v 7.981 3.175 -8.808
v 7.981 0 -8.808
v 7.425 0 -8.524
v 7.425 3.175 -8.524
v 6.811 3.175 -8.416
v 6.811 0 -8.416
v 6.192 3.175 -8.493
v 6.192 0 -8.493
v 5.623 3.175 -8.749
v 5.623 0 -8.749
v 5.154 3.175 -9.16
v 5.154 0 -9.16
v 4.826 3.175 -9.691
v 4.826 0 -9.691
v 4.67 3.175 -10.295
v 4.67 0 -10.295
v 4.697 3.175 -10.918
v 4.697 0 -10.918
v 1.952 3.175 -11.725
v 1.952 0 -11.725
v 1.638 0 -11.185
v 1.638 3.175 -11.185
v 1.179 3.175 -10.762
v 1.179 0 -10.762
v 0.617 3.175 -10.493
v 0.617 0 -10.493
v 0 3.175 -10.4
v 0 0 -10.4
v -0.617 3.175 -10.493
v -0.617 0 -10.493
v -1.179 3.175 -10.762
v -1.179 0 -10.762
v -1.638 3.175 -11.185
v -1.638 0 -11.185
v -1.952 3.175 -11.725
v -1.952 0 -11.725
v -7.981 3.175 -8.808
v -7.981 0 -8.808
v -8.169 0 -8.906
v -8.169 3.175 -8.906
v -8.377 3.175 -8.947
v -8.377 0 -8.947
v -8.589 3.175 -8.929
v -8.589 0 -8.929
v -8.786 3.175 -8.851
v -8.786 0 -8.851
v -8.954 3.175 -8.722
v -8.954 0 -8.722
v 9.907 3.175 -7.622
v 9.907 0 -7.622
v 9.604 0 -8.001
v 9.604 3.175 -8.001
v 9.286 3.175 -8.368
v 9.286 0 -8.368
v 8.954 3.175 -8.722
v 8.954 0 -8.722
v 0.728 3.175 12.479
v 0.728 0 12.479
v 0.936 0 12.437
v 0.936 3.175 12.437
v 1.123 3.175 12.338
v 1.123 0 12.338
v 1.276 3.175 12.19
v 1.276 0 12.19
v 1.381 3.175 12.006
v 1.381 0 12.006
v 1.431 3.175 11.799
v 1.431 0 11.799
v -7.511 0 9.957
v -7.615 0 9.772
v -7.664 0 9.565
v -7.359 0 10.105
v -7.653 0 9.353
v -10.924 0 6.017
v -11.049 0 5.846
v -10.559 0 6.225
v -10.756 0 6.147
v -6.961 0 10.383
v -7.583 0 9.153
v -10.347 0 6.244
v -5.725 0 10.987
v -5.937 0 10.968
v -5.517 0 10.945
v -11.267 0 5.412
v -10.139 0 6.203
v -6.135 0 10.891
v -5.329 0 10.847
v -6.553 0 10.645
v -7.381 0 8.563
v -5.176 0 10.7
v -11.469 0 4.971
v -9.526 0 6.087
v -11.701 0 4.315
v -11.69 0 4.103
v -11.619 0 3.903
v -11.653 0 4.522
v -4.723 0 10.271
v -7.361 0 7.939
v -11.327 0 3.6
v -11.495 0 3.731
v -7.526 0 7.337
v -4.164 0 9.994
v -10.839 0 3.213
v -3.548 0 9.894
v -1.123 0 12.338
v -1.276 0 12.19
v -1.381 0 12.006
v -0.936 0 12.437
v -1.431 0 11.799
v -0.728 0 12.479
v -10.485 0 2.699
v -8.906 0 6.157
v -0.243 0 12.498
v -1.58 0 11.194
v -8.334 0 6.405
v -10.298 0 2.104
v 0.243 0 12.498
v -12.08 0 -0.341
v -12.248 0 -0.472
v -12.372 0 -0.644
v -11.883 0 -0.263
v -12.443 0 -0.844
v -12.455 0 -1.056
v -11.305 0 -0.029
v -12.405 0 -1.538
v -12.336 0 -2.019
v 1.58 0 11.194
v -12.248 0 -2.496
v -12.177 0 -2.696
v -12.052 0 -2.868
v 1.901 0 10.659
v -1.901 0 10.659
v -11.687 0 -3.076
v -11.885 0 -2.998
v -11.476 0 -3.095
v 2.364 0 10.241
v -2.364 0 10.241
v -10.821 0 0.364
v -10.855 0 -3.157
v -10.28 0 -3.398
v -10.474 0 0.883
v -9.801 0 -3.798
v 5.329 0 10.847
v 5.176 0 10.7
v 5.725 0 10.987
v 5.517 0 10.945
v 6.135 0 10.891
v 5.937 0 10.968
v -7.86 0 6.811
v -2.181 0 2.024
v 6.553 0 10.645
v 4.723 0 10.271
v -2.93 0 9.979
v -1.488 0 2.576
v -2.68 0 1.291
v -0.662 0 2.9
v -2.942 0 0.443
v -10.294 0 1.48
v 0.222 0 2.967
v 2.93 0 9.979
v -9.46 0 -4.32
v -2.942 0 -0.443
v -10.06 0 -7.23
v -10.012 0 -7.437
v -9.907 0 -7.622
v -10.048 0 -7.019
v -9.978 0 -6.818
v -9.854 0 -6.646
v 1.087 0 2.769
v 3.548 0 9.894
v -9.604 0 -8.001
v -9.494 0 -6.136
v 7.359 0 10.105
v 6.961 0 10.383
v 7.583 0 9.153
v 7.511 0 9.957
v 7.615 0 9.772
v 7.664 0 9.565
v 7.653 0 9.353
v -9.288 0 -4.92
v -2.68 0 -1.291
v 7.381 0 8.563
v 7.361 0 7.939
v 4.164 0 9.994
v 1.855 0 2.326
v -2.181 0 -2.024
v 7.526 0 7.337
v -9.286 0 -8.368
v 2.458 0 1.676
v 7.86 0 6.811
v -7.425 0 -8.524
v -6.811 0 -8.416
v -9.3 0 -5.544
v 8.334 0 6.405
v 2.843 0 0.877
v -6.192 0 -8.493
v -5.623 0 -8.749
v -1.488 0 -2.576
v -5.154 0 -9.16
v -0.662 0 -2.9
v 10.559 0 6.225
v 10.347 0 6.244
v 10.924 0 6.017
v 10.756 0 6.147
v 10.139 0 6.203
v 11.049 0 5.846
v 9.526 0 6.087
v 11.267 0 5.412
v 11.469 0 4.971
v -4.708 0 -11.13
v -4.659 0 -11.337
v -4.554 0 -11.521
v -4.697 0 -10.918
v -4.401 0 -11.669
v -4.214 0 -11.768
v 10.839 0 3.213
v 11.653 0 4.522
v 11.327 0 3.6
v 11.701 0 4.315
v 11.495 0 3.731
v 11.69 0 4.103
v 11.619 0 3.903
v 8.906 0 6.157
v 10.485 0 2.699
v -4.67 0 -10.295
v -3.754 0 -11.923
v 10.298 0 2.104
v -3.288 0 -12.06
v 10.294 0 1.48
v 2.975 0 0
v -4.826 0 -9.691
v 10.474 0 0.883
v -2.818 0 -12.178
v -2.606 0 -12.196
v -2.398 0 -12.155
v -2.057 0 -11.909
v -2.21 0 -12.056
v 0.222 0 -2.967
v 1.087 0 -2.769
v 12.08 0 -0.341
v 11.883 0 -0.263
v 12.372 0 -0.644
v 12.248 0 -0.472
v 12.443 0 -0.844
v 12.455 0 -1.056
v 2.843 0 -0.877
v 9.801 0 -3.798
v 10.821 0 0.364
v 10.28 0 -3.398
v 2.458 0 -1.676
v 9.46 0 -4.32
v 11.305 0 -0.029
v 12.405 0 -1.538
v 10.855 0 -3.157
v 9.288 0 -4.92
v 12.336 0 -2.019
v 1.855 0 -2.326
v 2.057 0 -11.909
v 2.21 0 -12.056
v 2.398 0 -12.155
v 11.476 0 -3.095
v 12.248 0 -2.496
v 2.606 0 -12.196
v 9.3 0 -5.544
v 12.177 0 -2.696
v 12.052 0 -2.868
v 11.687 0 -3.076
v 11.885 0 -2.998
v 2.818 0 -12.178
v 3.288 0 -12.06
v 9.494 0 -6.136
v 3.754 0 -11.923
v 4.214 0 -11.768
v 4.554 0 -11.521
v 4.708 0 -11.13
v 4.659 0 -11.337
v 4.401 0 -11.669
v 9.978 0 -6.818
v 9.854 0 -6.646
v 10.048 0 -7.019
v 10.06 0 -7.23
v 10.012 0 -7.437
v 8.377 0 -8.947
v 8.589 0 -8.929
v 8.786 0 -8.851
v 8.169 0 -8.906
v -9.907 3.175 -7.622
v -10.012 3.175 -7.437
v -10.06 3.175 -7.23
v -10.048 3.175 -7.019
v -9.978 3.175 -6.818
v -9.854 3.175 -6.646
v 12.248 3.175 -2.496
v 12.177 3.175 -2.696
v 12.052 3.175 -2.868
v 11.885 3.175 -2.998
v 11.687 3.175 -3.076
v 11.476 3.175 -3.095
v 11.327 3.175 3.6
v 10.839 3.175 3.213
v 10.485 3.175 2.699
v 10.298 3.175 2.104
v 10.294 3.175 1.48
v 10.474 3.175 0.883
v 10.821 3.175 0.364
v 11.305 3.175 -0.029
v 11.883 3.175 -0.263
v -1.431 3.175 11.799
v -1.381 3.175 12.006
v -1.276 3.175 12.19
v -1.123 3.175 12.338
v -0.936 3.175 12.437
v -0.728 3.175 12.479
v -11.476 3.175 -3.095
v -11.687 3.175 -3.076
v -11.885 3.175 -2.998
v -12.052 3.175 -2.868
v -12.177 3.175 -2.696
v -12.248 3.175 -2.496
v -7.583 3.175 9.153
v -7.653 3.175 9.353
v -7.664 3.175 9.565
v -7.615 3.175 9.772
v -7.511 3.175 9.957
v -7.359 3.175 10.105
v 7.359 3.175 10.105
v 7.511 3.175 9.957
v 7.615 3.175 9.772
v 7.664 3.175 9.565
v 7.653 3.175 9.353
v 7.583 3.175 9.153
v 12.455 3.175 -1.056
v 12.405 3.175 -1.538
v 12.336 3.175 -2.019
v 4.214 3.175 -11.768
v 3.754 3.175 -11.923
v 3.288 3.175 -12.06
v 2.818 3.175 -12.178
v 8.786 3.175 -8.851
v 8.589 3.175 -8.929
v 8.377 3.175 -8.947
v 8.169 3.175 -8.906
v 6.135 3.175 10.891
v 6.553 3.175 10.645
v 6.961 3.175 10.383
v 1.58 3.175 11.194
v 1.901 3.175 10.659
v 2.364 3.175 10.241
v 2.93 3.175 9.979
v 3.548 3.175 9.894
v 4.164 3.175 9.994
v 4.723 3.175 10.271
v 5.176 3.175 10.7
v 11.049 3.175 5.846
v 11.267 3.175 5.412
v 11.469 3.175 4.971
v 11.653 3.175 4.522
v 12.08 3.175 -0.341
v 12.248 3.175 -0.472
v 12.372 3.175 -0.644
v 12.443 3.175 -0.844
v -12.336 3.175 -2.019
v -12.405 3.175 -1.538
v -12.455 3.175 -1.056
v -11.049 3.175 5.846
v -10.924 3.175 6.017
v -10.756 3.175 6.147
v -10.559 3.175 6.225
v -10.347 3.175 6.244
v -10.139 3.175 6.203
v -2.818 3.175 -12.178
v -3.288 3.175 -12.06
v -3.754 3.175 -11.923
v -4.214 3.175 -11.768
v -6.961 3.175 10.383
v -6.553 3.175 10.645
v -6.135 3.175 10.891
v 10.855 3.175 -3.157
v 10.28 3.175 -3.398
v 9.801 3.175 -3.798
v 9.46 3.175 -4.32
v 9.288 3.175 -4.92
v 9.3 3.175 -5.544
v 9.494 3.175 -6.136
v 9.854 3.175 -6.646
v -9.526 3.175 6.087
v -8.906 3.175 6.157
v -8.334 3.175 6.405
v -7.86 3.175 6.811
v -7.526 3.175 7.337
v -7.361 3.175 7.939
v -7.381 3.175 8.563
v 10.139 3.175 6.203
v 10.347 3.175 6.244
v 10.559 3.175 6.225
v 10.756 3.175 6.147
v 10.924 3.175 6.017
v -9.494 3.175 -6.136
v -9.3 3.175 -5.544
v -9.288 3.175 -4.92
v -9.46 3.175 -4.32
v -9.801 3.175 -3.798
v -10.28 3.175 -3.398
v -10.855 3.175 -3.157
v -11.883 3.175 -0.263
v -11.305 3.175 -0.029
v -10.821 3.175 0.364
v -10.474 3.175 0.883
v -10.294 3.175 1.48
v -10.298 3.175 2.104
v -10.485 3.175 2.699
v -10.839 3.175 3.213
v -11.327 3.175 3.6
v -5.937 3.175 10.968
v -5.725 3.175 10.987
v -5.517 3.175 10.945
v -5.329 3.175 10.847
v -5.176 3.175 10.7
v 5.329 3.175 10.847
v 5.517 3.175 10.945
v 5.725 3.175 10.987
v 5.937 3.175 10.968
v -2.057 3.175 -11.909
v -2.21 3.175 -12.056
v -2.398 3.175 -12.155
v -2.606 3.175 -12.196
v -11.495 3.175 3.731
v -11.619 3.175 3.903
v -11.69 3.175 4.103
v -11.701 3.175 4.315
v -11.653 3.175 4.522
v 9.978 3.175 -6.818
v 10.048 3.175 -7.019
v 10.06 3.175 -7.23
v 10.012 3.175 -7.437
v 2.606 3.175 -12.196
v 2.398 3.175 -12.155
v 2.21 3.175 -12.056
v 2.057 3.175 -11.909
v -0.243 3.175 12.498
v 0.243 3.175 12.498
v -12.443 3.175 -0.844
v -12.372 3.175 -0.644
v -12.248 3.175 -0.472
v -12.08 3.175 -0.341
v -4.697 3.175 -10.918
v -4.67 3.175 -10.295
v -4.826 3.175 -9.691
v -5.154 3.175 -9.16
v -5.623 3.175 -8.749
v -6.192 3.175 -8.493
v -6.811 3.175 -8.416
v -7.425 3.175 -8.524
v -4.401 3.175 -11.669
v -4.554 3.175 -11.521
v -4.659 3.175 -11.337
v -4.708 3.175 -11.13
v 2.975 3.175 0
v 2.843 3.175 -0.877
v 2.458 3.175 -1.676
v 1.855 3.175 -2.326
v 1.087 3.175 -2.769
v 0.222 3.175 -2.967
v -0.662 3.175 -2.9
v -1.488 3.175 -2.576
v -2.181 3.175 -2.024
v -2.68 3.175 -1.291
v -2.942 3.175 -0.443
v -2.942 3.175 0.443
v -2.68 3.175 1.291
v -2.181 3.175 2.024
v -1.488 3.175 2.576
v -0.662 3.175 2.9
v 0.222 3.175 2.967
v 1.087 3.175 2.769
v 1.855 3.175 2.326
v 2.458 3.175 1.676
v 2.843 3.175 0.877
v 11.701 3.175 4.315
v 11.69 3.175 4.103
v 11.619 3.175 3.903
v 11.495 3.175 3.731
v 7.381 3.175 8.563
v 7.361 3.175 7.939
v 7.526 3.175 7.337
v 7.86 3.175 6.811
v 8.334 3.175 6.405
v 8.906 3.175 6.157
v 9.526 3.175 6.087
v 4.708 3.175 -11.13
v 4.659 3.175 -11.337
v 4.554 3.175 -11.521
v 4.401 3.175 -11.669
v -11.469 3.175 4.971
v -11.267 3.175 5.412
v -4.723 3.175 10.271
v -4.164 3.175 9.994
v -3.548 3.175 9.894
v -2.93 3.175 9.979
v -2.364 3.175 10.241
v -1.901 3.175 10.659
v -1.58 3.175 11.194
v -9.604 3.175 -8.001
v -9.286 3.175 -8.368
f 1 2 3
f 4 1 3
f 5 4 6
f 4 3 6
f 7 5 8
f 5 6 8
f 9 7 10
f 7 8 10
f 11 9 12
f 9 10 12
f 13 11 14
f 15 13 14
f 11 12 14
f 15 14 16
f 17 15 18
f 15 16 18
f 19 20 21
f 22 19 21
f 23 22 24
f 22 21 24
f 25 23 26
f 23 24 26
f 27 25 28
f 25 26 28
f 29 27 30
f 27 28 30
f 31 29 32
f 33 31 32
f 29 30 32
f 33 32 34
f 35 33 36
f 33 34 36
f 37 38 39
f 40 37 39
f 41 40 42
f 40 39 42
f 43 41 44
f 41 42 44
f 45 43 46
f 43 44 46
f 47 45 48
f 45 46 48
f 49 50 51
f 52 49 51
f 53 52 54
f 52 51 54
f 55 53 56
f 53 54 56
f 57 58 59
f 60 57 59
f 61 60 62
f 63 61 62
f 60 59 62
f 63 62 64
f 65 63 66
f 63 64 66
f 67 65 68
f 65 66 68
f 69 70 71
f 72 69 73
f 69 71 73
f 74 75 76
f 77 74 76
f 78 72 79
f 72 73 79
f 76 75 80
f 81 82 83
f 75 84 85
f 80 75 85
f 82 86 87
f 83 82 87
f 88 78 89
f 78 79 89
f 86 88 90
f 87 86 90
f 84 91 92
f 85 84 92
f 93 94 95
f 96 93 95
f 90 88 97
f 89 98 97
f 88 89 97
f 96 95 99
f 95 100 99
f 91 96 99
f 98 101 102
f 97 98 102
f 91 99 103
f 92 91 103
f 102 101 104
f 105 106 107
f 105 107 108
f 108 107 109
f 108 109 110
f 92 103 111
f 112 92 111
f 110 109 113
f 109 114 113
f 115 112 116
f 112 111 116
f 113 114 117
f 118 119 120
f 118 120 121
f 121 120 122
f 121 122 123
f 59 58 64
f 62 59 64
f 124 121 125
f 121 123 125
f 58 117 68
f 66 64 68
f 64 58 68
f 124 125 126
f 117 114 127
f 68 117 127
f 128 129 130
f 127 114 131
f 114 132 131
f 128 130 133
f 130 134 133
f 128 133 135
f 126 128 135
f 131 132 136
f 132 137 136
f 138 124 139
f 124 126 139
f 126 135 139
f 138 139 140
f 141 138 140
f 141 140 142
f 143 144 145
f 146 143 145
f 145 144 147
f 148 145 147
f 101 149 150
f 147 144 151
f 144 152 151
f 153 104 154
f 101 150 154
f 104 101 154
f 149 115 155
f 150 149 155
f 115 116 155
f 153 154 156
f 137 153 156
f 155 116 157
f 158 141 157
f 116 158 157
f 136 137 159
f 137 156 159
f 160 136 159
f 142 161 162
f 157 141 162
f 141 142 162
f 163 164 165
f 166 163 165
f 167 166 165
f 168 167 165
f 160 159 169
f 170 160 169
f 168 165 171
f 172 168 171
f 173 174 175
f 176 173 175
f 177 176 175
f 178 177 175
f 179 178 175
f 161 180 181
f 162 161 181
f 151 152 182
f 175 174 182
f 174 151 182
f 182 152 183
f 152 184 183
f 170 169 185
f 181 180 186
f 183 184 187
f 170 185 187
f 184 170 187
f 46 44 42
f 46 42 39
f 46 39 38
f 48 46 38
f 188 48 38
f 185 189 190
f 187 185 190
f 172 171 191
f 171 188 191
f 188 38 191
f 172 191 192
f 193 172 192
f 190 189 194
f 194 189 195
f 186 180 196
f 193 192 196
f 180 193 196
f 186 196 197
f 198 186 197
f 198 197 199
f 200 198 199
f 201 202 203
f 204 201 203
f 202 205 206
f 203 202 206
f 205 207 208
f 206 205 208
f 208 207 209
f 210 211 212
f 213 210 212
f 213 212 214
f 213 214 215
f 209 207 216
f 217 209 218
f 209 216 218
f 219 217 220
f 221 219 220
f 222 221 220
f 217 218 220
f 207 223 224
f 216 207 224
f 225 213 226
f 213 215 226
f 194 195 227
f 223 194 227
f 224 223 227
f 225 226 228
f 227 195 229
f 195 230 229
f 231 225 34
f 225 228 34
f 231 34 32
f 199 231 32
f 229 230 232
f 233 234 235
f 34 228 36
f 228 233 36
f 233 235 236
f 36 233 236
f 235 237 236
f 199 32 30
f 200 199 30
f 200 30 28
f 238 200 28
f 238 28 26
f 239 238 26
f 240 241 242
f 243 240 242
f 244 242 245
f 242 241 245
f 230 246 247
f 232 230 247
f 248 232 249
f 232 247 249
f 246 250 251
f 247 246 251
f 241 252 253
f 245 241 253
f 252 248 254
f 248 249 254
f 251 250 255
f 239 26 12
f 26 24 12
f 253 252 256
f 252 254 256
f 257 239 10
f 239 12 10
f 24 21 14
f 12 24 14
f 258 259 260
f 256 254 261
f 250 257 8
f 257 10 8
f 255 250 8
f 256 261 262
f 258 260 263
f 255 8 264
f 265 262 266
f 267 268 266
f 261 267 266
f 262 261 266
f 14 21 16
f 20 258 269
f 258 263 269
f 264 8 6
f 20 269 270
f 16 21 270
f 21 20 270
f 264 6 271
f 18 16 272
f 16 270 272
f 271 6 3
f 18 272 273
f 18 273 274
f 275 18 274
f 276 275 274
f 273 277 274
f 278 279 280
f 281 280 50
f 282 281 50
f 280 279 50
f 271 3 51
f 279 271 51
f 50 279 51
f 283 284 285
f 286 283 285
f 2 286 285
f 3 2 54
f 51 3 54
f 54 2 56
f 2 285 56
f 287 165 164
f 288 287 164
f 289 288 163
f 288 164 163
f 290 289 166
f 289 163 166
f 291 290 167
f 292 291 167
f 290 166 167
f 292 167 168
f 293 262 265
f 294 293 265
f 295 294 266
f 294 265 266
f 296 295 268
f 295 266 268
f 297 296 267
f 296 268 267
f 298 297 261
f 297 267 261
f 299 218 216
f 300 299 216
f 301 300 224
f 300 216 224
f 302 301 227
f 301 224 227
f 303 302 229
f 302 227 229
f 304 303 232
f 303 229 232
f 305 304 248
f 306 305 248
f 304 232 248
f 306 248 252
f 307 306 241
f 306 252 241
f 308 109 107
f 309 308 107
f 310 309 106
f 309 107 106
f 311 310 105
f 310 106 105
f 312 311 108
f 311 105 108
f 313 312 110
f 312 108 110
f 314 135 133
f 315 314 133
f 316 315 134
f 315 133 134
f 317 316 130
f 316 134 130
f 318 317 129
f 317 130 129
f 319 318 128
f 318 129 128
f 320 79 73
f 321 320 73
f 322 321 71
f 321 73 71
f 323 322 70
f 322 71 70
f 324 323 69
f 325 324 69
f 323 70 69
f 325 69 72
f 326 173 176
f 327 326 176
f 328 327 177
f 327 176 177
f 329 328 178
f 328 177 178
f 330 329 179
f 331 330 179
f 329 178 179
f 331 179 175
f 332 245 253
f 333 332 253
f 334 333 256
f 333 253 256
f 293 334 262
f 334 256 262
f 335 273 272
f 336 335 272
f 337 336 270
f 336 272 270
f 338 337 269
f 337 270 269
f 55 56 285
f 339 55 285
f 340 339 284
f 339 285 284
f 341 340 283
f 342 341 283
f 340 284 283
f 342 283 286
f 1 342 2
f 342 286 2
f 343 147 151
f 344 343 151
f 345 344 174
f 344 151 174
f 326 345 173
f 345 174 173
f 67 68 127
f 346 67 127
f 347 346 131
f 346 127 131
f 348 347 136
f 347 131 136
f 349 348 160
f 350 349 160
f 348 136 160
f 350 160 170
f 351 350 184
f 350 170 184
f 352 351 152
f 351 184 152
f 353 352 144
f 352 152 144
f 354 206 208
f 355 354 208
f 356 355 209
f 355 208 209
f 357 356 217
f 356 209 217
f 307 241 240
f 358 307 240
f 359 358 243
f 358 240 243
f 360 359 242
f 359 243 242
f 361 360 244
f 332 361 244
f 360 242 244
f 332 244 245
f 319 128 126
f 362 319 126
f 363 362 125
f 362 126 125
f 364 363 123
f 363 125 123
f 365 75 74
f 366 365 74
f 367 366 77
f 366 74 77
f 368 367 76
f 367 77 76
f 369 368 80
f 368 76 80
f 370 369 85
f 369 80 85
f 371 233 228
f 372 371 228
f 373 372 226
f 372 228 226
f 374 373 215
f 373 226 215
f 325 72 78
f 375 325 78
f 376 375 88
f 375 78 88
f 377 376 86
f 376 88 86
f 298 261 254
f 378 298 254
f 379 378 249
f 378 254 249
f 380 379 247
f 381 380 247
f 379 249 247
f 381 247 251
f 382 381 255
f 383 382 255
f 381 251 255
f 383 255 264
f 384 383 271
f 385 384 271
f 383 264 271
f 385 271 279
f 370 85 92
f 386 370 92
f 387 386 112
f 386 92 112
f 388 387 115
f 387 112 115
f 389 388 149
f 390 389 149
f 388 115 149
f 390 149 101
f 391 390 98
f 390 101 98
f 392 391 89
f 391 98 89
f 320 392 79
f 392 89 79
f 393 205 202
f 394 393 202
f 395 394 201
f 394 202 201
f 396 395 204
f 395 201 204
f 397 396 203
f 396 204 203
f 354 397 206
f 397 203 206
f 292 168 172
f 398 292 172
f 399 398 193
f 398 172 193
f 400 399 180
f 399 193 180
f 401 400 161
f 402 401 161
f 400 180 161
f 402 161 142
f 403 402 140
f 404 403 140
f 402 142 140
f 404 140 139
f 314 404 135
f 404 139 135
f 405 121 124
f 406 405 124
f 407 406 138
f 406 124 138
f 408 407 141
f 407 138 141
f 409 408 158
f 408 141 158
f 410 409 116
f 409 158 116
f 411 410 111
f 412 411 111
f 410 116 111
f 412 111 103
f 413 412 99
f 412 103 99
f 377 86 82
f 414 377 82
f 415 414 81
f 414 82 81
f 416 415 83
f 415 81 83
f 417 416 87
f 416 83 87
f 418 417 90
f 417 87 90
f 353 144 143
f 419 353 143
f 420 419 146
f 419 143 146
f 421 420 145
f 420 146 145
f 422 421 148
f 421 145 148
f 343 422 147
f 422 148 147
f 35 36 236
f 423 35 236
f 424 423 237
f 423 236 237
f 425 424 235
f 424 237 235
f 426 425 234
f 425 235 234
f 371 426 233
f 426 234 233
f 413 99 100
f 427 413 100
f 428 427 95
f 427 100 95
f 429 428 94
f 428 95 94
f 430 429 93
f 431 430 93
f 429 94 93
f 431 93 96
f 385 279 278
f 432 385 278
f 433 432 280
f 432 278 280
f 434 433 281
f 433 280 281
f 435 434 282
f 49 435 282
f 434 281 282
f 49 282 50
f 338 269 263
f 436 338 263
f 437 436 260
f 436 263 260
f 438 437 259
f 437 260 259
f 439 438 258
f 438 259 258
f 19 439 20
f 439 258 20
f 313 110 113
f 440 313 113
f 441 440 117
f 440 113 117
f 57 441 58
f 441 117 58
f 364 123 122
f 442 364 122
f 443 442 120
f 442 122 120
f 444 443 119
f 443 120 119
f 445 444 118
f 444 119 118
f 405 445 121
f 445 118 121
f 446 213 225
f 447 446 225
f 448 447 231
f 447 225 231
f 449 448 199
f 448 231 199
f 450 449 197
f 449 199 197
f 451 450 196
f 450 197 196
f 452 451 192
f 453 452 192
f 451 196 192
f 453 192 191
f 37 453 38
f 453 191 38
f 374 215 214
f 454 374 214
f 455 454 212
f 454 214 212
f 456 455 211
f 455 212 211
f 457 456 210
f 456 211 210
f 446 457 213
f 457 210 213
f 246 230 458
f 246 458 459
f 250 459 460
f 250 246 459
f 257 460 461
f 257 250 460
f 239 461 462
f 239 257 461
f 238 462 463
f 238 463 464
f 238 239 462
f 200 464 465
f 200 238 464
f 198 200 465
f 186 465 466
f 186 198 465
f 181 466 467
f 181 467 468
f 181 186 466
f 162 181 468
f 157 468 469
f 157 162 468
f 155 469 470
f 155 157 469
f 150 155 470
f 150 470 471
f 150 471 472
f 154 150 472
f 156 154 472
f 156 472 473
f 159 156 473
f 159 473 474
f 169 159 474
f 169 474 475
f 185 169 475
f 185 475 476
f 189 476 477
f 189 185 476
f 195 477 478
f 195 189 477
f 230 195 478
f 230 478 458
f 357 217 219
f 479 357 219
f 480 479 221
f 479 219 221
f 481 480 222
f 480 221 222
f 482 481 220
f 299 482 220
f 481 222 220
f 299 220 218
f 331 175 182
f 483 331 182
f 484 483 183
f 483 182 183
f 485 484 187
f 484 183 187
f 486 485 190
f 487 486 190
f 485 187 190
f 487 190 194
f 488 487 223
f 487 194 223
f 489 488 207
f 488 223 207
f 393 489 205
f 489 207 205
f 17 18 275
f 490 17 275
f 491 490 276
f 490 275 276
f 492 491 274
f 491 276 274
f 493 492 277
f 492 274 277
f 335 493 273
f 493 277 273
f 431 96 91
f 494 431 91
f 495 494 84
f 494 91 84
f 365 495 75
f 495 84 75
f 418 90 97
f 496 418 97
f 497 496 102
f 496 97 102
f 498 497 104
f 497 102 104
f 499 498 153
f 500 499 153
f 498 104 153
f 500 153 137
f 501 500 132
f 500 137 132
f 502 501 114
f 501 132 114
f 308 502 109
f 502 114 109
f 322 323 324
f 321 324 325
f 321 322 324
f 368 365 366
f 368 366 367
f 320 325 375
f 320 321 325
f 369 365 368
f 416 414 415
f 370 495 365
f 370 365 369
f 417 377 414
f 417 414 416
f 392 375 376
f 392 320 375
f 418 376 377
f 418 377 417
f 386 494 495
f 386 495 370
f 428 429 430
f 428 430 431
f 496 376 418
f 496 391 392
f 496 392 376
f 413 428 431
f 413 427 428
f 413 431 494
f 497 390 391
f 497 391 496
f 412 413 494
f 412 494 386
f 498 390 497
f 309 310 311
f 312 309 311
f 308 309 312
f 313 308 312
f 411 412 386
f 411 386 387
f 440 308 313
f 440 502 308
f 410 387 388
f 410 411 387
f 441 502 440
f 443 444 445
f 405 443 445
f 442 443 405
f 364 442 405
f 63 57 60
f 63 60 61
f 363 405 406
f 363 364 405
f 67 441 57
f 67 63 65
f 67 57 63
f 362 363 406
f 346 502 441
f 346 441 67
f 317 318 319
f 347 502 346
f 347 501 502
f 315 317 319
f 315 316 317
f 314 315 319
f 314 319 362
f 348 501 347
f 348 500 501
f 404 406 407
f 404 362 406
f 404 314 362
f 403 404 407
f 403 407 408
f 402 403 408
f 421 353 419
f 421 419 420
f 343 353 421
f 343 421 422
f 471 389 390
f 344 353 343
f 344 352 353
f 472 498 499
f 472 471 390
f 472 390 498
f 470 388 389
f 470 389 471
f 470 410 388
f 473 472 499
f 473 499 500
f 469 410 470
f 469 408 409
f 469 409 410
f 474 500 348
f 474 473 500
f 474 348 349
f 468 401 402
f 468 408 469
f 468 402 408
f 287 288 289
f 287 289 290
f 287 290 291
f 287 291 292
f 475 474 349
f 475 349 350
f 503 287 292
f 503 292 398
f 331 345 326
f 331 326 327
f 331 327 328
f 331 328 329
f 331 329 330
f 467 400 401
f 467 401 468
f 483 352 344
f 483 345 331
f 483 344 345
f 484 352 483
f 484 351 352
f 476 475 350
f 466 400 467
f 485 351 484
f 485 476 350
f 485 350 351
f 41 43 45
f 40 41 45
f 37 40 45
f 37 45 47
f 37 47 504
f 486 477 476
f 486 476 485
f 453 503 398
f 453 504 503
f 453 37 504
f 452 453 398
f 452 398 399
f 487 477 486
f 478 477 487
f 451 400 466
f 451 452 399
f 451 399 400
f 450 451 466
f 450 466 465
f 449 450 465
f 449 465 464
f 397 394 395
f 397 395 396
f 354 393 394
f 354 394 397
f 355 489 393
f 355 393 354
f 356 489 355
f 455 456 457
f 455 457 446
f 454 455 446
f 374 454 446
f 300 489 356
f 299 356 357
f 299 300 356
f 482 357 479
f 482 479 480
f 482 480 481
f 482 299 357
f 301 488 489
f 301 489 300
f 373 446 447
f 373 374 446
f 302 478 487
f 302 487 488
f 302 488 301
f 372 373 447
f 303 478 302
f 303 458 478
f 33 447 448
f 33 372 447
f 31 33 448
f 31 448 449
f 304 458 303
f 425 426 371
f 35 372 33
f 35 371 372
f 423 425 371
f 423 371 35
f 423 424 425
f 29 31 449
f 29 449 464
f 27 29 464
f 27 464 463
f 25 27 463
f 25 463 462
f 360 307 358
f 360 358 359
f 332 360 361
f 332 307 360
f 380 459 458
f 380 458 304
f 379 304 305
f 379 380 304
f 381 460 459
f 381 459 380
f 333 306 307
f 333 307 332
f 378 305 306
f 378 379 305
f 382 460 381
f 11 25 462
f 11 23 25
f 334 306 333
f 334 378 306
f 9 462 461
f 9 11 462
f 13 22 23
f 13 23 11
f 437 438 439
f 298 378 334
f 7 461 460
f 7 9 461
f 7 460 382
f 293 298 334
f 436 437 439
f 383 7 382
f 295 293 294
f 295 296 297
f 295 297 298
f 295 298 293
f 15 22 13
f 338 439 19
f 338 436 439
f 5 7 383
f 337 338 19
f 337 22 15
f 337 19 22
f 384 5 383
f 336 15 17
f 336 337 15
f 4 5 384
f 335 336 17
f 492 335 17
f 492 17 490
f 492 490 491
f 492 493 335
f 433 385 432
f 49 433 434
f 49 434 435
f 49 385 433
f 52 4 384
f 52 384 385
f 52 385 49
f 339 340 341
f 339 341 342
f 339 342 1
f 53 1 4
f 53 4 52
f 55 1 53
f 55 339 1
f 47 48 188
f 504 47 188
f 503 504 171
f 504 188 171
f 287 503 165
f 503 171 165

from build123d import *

# Parameters (mm, degrees)
SKETCH1_R           = 2.975
BOSS_EXTRUDE1_DEPTH = 3.175


with BuildPart() as part:
    # Sketch1 → Boss-Extrude1 (new body)
    with BuildSketch(Plane(origin=(0, 0, 0), x_dir=(1, 0, 0), z_dir=(0, 1, 0))):
        with BuildLine():
            ThreePointArc((11.882947492, 0.263140878), (12.316055042, 0.553383075), (12.455331476, 1.055801982))
            ThreePointArc((12.455331476, 1.055801982), (12.372768024, 1.778935478), (12.248256827, 2.4960378))
            ThreePointArc((12.248256827, 2.4960378), (11.973074304, 2.938866505), (11.475739976, 3.095331356))
            ThreePointArc((11.475739976, 3.095331356), (9.460172752, 4.320316135), (9.854306858, 6.645774639))
            ThreePointArc((9.854306858, 6.645774639), (10.061743337, 7.124097533), (9.90728196, 7.622057738))
            ThreePointArc((9.90728196, 7.622057738), (9.446869679, 8.185759174), (8.95442941, 8.721708201))
            ThreePointArc((8.95442941, 8.721708201), (8.483519867, 8.945464509), (7.980544323, 8.80821188))
            ThreePointArc((7.980544323, 8.80821188), (5.622664502, 8.749036741), (4.696993425, 10.918421909))
            ThreePointArc((4.696993425, 10.918421909), (4.612899215, 11.43296136), (4.213740424, 11.768364017))
            ThreePointArc((4.213740424, 11.768364017), (3.521656961, 11.99366217), (2.817633925, 12.178297872))
            ThreePointArc((2.817633925, 12.178297872), (2.300507814, 12.111940737), (1.951582234, 11.724547368))
            ThreePointArc((1.951582234, 11.724547368), (0, 10.4), (-1.951582234, 11.724547368))
            ThreePointArc((-1.951582234, 11.724547368), (-2.300507814, 12.111940737), (-2.817633925, 12.178297872))
            ThreePointArc((-2.817633925, 12.178297872), (-3.521656961, 11.99366217), (-4.213740424, 11.768364017))
            ThreePointArc((-4.213740424, 11.768364017), (-4.612899215, 11.43296136), (-4.696993425, 10.918421909))
            ThreePointArc((-4.696993425, 10.918421909), (-5.622664502, 8.749036741), (-7.980544323, 8.80821188))
            ThreePointArc((-7.980544323, 8.80821188), (-8.483519867, 8.945464509), (-8.95442941, 8.721708201))
            ThreePointArc((-8.95442941, 8.721708201), (-9.446869679, 8.185759174), (-9.90728196, 7.622057738))
            ThreePointArc((-9.90728196, 7.622057738), (-10.061743337, 7.124097533), (-9.854306858, 6.645774639))
            ThreePointArc((-9.854306858, 6.645774639), (-9.460172752, 4.320316135), (-11.475739976, 3.095331356))
            ThreePointArc((-11.475739976, 3.095331356), (-11.973074304, 2.938866505), (-12.248256827, 2.4960378))
            ThreePointArc((-12.248256827, 2.4960378), (-12.372768024, 1.778935478), (-12.455331476, 1.055801982))
            ThreePointArc((-12.455331476, 1.055801982), (-12.316055042, 0.553383075), (-11.882947492, 0.263140878))
            ThreePointArc((-11.882947492, 0.263140878), (-10.294142996, -1.480074318), (-11.327469272, -3.600295003))
            ThreePointArc((-11.327469272, -3.600295003), (-11.661262247, -4.000800849), (-11.653349243, -4.522106966))
            ThreePointArc((-11.653349243, -4.522106966), (-11.370399942, -5.192687663), (-11.048901253, -5.845663444))
            ThreePointArc((-11.048901253, -5.845663444), (-10.660106293, -6.193026599), (-10.138836257, -6.203038252))
            ThreePointArc((-10.138836257, -6.203038252), (-7.859795573, -6.810551633), (-7.582807109, -9.152853138))
            ThreePointArc((-7.582807109, -9.152853138), (-7.647081821, -9.670242202), (-7.358585614, -10.104514722))
            ThreePointArc((-7.358585614, -10.104514722), (-6.758010218, -10.51566916), (-6.13452295, -10.891172029))
            ThreePointArc((-6.13452295, -10.891172029), (-5.619649116, -10.973194086), (-5.175716149, -10.699796566))
            ThreePointArc((-5.175716149, -10.699796566), (-2.930018591, -9.978726926), (-1.430657267, -11.799445071))
            ThreePointArc((-1.430657267, -11.799445071), (-1.205006949, -12.269449983), (-0.727523045, -12.478810449))
            ThreePointArc((-0.727523045, -12.478810449), (0, -12.5), (0.727523045, -12.478810449))
            ThreePointArc((0.727523045, -12.478810449), (1.205006949, -12.269449983), (1.430657267, -11.799445071))
            ThreePointArc((1.430657267, -11.799445071), (2.930018591, -9.978726926), (5.175716149, -10.699796566))
            ThreePointArc((5.175716149, -10.699796566), (5.619649116, -10.973194086), (6.13452295, -10.891172029))
            ThreePointArc((6.13452295, -10.891172029), (6.758010218, -10.51566916), (7.358585614, -10.104514722))
            ThreePointArc((7.358585614, -10.104514722), (7.647081821, -9.670242202), (7.582807109, -9.152853138))
            ThreePointArc((7.582807109, -9.152853138), (7.859795573, -6.810551633), (10.138836257, -6.203038252))
            ThreePointArc((10.138836257, -6.203038252), (10.660106293, -6.193026599), (11.048901253, -5.845663444))
            ThreePointArc((11.048901253, -5.845663444), (11.370399942, -5.192687663), (11.653349243, -4.522106966))
            ThreePointArc((11.653349243, -4.522106966), (11.661262247, -4.000800849), (11.327469272, -3.600295003))
            ThreePointArc((11.327469272, -3.600295003), (10.294142996, -1.480074318), (11.882947492, 0.263140878))
        make_face()
        Circle(SKETCH1_R, mode=Mode.SUBTRACT)
    extrude(amount=BOSS_EXTRUDE1_DEPTH)


solid = part.part
